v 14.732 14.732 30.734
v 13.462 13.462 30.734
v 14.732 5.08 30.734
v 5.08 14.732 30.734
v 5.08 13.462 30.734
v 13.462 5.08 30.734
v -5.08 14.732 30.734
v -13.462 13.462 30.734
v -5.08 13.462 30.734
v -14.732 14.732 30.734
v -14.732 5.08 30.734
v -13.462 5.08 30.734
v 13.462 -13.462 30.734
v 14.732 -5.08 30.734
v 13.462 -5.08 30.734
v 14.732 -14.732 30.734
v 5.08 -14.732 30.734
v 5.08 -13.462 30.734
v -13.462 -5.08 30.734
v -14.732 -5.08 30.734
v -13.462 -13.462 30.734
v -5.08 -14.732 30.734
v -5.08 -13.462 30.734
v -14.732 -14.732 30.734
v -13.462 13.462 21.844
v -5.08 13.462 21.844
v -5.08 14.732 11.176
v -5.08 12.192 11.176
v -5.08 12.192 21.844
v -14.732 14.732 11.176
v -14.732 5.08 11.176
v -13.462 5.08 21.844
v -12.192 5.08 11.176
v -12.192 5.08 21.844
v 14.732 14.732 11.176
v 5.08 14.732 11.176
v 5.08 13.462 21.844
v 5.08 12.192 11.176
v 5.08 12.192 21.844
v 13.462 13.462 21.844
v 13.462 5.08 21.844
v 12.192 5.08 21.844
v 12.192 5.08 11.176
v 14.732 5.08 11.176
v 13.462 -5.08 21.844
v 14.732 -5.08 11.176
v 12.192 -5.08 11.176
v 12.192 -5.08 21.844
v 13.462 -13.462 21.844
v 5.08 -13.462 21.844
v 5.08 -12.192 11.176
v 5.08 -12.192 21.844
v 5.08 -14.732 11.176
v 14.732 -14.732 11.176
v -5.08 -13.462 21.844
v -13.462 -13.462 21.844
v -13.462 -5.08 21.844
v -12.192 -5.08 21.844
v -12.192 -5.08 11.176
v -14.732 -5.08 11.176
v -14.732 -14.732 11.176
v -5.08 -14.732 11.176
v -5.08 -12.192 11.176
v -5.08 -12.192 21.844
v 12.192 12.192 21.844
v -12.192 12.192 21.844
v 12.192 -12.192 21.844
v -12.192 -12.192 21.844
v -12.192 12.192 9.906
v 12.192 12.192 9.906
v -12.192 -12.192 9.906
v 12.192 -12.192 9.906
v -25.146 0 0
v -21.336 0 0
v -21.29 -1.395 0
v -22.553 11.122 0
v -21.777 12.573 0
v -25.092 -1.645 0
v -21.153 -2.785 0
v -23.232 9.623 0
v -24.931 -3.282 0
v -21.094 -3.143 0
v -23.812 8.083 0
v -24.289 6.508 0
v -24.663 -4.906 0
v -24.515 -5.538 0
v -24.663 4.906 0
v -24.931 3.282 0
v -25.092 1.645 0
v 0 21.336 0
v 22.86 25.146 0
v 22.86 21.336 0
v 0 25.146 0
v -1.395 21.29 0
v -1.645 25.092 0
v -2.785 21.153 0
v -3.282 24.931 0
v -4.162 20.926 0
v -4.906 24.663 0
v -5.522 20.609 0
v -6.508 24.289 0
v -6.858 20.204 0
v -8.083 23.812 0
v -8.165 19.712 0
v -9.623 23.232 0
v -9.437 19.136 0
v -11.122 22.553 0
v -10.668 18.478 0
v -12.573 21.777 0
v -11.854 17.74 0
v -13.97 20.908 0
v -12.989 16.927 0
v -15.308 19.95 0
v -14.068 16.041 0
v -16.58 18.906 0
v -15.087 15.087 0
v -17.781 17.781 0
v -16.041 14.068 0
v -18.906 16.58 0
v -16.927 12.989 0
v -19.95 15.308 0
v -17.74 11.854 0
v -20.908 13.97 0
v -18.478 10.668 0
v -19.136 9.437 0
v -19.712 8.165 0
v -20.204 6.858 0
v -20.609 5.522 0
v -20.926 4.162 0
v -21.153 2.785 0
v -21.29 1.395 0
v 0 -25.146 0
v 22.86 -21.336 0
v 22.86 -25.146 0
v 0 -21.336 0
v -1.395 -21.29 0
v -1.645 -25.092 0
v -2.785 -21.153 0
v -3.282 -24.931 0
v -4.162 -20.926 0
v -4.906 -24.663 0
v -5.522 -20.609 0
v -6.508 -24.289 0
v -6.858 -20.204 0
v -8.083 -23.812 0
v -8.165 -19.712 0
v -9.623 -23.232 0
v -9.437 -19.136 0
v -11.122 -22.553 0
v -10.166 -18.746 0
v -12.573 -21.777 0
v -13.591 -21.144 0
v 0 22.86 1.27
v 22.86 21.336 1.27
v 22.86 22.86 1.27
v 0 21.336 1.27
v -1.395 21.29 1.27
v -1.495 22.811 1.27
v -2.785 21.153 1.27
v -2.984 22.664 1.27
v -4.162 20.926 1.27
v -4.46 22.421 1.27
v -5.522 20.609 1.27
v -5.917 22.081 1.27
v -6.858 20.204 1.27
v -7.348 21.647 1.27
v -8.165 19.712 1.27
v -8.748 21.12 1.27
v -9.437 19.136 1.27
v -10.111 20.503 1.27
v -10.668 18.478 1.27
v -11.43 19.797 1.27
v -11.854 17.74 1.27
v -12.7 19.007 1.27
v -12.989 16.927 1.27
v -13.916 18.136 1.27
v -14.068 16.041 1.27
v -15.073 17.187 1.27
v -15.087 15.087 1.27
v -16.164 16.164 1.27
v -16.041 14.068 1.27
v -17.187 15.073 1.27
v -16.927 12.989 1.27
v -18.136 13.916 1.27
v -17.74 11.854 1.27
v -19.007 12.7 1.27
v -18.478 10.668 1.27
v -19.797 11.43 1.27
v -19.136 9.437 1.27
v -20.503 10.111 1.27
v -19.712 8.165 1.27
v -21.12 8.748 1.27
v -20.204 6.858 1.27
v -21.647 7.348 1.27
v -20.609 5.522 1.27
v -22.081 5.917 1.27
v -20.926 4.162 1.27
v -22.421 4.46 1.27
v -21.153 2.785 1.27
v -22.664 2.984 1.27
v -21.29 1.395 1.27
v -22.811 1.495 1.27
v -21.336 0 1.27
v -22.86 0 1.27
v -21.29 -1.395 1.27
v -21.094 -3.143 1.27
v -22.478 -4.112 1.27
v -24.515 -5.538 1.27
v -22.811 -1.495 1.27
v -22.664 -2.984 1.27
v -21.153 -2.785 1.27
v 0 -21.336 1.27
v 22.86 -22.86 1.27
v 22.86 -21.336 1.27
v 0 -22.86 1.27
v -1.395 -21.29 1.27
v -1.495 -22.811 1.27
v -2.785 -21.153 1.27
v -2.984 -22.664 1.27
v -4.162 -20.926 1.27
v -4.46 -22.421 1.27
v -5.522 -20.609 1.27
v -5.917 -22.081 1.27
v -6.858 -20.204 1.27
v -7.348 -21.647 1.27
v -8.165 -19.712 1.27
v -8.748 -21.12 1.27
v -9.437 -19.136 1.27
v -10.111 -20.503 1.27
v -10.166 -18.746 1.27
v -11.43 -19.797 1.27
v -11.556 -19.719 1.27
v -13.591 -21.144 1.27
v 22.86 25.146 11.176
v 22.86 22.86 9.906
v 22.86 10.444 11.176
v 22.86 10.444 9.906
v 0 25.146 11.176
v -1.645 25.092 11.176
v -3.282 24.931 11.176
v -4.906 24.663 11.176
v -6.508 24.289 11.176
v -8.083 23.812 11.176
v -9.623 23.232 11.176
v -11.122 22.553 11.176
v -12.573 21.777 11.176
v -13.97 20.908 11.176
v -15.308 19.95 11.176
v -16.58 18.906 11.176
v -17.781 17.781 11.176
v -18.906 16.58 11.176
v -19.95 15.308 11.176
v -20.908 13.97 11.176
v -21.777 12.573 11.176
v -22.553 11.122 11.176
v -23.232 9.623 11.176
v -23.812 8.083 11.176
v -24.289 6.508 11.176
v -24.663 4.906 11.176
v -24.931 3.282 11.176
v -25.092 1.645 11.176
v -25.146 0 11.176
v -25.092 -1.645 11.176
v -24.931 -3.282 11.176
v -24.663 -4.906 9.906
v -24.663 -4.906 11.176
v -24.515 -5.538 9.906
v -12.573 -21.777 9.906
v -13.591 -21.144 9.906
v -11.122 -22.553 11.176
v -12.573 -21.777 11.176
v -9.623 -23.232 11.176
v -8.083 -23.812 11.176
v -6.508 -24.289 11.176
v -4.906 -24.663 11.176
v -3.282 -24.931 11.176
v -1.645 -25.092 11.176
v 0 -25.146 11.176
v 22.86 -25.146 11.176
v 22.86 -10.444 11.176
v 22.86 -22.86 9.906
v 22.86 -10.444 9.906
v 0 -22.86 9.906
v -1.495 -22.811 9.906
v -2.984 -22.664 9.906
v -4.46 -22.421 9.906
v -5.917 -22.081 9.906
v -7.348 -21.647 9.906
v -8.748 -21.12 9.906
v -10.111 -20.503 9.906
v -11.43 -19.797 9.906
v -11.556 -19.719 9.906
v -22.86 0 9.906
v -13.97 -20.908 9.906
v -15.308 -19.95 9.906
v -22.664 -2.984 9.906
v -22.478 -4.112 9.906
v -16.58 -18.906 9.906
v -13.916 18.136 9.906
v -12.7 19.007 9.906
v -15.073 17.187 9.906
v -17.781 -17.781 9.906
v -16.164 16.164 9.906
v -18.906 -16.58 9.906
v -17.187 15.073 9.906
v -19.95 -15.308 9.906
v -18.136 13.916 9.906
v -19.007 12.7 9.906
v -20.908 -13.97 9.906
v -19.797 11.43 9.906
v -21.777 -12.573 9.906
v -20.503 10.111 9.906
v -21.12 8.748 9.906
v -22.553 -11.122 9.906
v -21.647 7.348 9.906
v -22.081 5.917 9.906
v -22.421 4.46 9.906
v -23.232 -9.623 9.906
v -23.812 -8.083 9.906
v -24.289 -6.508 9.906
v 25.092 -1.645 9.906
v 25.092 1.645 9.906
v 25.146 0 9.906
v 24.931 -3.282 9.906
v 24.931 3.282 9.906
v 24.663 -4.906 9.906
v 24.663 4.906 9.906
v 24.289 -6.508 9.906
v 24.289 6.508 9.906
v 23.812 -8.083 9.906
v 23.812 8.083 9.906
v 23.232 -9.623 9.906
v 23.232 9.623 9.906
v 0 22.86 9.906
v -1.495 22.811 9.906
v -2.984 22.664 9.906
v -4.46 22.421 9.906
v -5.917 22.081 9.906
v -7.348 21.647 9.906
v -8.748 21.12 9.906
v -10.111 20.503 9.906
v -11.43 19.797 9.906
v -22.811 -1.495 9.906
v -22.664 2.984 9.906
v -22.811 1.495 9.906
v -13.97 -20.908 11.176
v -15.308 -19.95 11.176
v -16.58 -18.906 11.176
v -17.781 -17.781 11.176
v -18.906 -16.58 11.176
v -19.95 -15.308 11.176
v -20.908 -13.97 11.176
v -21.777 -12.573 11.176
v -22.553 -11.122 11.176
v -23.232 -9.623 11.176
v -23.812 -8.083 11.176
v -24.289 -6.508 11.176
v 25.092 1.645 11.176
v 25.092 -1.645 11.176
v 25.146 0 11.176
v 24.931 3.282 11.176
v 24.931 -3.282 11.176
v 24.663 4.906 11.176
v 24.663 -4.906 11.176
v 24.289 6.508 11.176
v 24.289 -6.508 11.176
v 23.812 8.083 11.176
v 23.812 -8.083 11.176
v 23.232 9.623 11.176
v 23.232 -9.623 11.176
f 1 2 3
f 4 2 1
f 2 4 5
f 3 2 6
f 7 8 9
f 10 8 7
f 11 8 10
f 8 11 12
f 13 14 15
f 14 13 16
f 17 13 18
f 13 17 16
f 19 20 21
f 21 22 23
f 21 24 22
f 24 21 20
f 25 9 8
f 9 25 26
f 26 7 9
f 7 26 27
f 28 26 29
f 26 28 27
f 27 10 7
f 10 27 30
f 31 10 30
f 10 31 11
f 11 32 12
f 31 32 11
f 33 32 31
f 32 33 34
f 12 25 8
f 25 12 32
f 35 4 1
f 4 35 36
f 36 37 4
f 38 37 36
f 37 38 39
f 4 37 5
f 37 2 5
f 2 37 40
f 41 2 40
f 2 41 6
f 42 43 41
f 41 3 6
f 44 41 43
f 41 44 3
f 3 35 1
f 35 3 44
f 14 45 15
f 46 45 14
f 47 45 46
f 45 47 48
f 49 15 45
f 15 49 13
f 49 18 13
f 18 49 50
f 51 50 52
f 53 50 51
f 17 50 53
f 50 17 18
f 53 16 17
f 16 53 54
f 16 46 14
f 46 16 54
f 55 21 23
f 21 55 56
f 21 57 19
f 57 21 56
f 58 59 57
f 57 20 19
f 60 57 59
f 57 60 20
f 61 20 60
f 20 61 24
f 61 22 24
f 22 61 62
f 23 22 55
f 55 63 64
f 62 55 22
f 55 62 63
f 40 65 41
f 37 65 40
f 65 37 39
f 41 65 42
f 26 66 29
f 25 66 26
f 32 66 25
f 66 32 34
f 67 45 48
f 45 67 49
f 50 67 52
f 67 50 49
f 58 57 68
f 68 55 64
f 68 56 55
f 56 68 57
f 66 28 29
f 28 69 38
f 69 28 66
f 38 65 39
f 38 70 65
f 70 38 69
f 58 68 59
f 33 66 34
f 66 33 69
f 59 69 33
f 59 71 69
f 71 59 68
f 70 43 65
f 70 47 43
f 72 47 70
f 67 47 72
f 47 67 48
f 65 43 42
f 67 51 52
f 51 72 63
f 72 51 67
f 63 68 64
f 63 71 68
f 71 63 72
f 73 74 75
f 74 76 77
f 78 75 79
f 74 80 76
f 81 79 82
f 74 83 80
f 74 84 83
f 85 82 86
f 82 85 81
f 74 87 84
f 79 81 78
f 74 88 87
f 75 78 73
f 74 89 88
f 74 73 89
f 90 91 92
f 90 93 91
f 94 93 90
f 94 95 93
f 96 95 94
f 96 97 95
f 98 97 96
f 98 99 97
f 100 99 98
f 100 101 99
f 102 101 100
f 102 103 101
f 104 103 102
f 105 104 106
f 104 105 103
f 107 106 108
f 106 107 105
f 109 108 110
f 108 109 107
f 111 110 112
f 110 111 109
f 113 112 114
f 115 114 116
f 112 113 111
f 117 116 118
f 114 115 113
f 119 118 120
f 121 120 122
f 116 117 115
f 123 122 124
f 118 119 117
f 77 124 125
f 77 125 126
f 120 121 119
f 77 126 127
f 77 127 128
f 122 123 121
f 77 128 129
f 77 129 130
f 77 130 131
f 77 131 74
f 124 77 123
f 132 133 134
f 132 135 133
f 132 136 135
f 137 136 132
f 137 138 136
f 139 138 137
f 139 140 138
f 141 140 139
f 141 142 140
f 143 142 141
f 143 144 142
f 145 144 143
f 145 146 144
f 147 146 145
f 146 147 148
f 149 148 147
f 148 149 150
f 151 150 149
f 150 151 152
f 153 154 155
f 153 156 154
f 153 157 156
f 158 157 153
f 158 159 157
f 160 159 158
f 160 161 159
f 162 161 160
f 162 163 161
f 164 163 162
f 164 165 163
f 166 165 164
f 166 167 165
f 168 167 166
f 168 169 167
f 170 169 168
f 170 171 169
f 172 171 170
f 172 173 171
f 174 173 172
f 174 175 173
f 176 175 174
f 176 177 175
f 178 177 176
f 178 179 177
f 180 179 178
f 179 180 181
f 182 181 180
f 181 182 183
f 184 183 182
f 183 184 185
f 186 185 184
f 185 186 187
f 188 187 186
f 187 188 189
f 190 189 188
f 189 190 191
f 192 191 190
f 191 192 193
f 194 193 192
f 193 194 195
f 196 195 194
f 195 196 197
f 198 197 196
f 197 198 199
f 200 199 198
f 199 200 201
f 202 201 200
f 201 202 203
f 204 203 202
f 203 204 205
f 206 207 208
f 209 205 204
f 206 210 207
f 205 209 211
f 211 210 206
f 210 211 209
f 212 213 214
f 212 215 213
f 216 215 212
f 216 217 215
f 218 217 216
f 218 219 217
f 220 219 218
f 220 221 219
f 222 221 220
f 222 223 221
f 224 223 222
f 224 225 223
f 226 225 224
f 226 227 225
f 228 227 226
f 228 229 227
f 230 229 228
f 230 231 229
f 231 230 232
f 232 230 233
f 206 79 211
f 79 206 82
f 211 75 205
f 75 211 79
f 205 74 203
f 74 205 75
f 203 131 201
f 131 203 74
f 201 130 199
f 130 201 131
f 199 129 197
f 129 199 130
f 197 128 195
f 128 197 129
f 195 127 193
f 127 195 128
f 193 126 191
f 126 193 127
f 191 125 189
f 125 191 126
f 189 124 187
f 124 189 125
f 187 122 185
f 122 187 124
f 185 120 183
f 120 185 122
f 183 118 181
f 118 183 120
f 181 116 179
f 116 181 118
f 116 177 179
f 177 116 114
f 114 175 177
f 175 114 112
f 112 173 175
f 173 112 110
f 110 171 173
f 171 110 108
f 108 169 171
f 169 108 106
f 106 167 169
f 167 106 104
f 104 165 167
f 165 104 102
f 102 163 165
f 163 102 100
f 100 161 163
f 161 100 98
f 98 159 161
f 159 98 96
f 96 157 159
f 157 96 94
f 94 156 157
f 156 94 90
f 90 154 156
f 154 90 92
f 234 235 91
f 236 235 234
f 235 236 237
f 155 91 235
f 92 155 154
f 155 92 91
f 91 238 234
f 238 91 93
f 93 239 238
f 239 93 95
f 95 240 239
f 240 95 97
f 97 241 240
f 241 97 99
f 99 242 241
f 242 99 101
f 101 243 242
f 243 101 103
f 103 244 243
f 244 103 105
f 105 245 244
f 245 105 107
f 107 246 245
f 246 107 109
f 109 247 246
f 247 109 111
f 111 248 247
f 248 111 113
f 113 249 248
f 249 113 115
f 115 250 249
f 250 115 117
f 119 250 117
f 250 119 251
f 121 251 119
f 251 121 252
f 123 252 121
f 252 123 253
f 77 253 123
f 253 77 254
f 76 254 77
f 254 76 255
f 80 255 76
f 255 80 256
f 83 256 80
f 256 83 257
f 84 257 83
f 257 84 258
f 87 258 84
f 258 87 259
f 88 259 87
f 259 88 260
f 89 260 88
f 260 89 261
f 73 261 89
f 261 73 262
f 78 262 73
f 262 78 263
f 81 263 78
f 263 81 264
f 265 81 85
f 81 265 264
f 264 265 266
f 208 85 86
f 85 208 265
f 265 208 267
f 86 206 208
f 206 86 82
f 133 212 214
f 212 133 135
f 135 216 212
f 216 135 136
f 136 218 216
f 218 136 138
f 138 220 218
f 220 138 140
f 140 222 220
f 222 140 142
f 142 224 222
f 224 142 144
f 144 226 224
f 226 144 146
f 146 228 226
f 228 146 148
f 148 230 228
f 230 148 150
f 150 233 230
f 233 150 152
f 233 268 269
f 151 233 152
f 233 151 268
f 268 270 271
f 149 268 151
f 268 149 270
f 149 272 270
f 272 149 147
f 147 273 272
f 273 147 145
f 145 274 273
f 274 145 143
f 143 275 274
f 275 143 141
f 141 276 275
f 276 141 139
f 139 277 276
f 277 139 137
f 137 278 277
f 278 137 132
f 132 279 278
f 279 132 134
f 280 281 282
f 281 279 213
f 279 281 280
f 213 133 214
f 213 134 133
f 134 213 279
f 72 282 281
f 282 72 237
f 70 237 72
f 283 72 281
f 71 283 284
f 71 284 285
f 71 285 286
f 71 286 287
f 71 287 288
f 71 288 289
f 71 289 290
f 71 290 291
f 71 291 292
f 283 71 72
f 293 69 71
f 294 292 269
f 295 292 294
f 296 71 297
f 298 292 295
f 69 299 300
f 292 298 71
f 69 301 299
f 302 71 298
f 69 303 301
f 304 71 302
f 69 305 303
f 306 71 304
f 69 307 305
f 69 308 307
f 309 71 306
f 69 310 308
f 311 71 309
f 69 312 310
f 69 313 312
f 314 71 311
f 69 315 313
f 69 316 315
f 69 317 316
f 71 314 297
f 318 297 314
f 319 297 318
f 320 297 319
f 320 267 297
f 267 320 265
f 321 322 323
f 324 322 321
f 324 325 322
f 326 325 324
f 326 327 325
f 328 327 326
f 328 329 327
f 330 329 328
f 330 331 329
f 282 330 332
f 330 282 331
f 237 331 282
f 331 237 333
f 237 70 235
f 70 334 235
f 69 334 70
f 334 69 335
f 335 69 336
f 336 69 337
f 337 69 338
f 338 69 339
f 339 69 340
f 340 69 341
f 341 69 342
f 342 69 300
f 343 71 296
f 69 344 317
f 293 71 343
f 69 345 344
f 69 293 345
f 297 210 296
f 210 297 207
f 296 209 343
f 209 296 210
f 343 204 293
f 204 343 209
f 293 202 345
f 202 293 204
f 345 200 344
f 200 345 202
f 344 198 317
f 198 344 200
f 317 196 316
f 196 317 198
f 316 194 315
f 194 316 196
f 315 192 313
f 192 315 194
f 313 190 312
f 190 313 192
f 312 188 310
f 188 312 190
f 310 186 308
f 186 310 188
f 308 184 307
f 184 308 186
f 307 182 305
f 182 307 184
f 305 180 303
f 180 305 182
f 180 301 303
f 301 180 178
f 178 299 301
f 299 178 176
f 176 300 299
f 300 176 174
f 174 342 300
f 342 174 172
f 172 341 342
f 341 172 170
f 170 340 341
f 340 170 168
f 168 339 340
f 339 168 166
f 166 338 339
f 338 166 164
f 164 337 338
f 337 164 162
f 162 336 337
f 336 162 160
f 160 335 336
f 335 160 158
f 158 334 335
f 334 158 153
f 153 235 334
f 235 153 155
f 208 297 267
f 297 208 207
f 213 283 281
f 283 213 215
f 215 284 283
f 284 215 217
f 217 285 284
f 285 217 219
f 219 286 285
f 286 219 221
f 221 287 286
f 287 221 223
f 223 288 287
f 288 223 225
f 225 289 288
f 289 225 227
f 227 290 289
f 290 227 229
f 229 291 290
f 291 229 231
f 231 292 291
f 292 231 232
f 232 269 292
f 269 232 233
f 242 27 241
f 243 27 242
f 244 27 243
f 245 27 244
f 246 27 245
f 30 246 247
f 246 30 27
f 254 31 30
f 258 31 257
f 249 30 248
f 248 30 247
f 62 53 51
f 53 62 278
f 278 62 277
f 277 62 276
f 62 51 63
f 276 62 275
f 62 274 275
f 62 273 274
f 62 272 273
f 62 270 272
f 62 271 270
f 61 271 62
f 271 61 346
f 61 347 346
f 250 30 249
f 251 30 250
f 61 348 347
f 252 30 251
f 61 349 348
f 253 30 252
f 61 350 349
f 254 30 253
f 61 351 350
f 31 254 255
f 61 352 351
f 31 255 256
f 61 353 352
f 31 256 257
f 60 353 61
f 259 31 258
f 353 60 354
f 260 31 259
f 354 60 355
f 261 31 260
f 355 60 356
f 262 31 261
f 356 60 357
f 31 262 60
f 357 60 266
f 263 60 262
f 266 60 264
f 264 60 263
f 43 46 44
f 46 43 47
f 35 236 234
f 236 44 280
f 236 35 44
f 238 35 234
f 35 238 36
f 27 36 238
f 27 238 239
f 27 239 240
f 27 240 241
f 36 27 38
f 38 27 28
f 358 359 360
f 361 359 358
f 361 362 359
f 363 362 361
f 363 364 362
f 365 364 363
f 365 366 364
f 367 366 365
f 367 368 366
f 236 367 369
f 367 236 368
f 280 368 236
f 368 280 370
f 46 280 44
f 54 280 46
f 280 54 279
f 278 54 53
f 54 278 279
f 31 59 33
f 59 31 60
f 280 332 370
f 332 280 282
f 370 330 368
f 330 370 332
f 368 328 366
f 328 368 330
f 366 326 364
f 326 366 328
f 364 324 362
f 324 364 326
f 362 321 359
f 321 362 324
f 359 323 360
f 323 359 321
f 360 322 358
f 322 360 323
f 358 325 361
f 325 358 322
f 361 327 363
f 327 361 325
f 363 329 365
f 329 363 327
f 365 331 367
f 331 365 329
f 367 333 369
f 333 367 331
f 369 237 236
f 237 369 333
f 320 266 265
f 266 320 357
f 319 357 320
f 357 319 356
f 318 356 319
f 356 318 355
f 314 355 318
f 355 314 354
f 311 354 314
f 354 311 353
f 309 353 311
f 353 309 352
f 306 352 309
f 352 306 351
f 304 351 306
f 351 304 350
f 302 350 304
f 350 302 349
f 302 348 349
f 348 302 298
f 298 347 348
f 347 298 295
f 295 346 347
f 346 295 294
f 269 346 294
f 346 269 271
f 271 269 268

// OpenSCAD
ViewScale = [0.0254, 0.0254, 0.0254];

module rotcutouts() {
    for(ii=[0:90:360]) {
        rotate([0, 0, ii])
        translate([0, 500, 0])
        square([400, 200], center=true);
    }
}

module bodycutout2()
{
    difference() {
        circle(1110/2, $fn=96);
        circle(1010/2, $fn=96);
        scale([1.3,1.3,1.3])
        translate([0, 500, 0])
        square([400, 200], center=true);
        //rotcutouts();
    }
}

module bodycutout3()
{
    difference() {
        circle(1110/2, $fn=96);
        circle(1010/2, $fn=96);
        *scale([1.3,1.3,1.3])
        translate([0, 500, 0])
        square([400, 200], center=true);
        //rotcutouts();
    }
}

module ledframe2()
{
    difference() {
    square([1030, 1030], center=true);
    square([800, 800], center=true);
    rotcutouts();
//    translate([0, 500, 0])
//    square([400, 200], center=true);
    }
}

module ledframe1()
{
    difference() {
        square([1030, 1030], center=true);
        square([900, 900], center=true);
        rotcutouts();
    }
}

module ledmount()
{
    linear_extrude(200){
        ledframe1();
    }

    translate([0, 0, 200])
    linear_extrude(200)
    ledframe2();

    translate([0, 0, 200])
    linear_extrude(400)
    bodycutout2();

    translate([0, 0, 400])
    linear_extrude(1000)
    bodycutout3();

}

module ledshroud()
{
    // slips over led mount
    linear_extrude(800)
    difference() {
        square([1160, 1160], center=true);
        square([1060, 1060], center=true);
        translate([0, 500, 0])
        square([400, 200], center=true);
        rotcutouts();
    }

    // slips over heatsink
    linear_extrude(450)
    difference() {
        square([1060, 1060], center=true);
        square([960, 960], center=true);
        translate([0, 500, 0])
        square([400, 200], center=true);
        rotcutouts();
    }
}

module fanshroudside() 
{
    linear_extrude(340)
    difference() {
        union() {
            circle(1980/2, $fn=96);
            translate([450, 0, 0])
            square([900, 1980], center=true);
        }
        union() {
            circle(1800/2, $fn=96);
            translate([550, 0, 0])
            square([1100, 1800], center=true);
        }
        rotate([0, 0, 125])
        translate([0, 850, 0])
        square([750, 450], center=true);
    }
}

module fanshroudupper() 
{
    linear_extrude(50)
    difference() {
        union() {
            circle(1980/2, $fn=96);
            translate([450, 0, 0])
            square([900, 1980], center=true);
        }
        union() {
            circle(1680/2, $fn=96);
            translate([550, 0, 0])
            square([1100, 1680], center=true);
        }
        rotate([0, 0, 125])
        translate([0, 850, 0])
        square([750, 450], center=true);
//        rotate([0, 0, 60])
//        translate([0, 850, 0])
//        square([650, 450], center=true);
    }
}

module fanshroudlower() 
{
    linear_extrude(50)
    difference() {
        union() {
            circle(1980/2, $fn=96);
            translate([450, 0, 0])
            square([900, 1980], center=true);
        }
        square([960, 960], center=true);
//        union() {
//            circle(1680/2, $fn=96);
//            translate([550, 0, 0])
//            square([1100, 1680], center=true);
//        }
    }
}

scale(ViewScale)
{
//    translate([0, 0, 1400])
//    ledmount();

    translate([0, 0, 410])
    ledshroud();

    fanshroudupper();
    translate([0, 0, 50])
    fanshroudside();
    translate([0, 0, 390])
    fanshroudlower();
}
